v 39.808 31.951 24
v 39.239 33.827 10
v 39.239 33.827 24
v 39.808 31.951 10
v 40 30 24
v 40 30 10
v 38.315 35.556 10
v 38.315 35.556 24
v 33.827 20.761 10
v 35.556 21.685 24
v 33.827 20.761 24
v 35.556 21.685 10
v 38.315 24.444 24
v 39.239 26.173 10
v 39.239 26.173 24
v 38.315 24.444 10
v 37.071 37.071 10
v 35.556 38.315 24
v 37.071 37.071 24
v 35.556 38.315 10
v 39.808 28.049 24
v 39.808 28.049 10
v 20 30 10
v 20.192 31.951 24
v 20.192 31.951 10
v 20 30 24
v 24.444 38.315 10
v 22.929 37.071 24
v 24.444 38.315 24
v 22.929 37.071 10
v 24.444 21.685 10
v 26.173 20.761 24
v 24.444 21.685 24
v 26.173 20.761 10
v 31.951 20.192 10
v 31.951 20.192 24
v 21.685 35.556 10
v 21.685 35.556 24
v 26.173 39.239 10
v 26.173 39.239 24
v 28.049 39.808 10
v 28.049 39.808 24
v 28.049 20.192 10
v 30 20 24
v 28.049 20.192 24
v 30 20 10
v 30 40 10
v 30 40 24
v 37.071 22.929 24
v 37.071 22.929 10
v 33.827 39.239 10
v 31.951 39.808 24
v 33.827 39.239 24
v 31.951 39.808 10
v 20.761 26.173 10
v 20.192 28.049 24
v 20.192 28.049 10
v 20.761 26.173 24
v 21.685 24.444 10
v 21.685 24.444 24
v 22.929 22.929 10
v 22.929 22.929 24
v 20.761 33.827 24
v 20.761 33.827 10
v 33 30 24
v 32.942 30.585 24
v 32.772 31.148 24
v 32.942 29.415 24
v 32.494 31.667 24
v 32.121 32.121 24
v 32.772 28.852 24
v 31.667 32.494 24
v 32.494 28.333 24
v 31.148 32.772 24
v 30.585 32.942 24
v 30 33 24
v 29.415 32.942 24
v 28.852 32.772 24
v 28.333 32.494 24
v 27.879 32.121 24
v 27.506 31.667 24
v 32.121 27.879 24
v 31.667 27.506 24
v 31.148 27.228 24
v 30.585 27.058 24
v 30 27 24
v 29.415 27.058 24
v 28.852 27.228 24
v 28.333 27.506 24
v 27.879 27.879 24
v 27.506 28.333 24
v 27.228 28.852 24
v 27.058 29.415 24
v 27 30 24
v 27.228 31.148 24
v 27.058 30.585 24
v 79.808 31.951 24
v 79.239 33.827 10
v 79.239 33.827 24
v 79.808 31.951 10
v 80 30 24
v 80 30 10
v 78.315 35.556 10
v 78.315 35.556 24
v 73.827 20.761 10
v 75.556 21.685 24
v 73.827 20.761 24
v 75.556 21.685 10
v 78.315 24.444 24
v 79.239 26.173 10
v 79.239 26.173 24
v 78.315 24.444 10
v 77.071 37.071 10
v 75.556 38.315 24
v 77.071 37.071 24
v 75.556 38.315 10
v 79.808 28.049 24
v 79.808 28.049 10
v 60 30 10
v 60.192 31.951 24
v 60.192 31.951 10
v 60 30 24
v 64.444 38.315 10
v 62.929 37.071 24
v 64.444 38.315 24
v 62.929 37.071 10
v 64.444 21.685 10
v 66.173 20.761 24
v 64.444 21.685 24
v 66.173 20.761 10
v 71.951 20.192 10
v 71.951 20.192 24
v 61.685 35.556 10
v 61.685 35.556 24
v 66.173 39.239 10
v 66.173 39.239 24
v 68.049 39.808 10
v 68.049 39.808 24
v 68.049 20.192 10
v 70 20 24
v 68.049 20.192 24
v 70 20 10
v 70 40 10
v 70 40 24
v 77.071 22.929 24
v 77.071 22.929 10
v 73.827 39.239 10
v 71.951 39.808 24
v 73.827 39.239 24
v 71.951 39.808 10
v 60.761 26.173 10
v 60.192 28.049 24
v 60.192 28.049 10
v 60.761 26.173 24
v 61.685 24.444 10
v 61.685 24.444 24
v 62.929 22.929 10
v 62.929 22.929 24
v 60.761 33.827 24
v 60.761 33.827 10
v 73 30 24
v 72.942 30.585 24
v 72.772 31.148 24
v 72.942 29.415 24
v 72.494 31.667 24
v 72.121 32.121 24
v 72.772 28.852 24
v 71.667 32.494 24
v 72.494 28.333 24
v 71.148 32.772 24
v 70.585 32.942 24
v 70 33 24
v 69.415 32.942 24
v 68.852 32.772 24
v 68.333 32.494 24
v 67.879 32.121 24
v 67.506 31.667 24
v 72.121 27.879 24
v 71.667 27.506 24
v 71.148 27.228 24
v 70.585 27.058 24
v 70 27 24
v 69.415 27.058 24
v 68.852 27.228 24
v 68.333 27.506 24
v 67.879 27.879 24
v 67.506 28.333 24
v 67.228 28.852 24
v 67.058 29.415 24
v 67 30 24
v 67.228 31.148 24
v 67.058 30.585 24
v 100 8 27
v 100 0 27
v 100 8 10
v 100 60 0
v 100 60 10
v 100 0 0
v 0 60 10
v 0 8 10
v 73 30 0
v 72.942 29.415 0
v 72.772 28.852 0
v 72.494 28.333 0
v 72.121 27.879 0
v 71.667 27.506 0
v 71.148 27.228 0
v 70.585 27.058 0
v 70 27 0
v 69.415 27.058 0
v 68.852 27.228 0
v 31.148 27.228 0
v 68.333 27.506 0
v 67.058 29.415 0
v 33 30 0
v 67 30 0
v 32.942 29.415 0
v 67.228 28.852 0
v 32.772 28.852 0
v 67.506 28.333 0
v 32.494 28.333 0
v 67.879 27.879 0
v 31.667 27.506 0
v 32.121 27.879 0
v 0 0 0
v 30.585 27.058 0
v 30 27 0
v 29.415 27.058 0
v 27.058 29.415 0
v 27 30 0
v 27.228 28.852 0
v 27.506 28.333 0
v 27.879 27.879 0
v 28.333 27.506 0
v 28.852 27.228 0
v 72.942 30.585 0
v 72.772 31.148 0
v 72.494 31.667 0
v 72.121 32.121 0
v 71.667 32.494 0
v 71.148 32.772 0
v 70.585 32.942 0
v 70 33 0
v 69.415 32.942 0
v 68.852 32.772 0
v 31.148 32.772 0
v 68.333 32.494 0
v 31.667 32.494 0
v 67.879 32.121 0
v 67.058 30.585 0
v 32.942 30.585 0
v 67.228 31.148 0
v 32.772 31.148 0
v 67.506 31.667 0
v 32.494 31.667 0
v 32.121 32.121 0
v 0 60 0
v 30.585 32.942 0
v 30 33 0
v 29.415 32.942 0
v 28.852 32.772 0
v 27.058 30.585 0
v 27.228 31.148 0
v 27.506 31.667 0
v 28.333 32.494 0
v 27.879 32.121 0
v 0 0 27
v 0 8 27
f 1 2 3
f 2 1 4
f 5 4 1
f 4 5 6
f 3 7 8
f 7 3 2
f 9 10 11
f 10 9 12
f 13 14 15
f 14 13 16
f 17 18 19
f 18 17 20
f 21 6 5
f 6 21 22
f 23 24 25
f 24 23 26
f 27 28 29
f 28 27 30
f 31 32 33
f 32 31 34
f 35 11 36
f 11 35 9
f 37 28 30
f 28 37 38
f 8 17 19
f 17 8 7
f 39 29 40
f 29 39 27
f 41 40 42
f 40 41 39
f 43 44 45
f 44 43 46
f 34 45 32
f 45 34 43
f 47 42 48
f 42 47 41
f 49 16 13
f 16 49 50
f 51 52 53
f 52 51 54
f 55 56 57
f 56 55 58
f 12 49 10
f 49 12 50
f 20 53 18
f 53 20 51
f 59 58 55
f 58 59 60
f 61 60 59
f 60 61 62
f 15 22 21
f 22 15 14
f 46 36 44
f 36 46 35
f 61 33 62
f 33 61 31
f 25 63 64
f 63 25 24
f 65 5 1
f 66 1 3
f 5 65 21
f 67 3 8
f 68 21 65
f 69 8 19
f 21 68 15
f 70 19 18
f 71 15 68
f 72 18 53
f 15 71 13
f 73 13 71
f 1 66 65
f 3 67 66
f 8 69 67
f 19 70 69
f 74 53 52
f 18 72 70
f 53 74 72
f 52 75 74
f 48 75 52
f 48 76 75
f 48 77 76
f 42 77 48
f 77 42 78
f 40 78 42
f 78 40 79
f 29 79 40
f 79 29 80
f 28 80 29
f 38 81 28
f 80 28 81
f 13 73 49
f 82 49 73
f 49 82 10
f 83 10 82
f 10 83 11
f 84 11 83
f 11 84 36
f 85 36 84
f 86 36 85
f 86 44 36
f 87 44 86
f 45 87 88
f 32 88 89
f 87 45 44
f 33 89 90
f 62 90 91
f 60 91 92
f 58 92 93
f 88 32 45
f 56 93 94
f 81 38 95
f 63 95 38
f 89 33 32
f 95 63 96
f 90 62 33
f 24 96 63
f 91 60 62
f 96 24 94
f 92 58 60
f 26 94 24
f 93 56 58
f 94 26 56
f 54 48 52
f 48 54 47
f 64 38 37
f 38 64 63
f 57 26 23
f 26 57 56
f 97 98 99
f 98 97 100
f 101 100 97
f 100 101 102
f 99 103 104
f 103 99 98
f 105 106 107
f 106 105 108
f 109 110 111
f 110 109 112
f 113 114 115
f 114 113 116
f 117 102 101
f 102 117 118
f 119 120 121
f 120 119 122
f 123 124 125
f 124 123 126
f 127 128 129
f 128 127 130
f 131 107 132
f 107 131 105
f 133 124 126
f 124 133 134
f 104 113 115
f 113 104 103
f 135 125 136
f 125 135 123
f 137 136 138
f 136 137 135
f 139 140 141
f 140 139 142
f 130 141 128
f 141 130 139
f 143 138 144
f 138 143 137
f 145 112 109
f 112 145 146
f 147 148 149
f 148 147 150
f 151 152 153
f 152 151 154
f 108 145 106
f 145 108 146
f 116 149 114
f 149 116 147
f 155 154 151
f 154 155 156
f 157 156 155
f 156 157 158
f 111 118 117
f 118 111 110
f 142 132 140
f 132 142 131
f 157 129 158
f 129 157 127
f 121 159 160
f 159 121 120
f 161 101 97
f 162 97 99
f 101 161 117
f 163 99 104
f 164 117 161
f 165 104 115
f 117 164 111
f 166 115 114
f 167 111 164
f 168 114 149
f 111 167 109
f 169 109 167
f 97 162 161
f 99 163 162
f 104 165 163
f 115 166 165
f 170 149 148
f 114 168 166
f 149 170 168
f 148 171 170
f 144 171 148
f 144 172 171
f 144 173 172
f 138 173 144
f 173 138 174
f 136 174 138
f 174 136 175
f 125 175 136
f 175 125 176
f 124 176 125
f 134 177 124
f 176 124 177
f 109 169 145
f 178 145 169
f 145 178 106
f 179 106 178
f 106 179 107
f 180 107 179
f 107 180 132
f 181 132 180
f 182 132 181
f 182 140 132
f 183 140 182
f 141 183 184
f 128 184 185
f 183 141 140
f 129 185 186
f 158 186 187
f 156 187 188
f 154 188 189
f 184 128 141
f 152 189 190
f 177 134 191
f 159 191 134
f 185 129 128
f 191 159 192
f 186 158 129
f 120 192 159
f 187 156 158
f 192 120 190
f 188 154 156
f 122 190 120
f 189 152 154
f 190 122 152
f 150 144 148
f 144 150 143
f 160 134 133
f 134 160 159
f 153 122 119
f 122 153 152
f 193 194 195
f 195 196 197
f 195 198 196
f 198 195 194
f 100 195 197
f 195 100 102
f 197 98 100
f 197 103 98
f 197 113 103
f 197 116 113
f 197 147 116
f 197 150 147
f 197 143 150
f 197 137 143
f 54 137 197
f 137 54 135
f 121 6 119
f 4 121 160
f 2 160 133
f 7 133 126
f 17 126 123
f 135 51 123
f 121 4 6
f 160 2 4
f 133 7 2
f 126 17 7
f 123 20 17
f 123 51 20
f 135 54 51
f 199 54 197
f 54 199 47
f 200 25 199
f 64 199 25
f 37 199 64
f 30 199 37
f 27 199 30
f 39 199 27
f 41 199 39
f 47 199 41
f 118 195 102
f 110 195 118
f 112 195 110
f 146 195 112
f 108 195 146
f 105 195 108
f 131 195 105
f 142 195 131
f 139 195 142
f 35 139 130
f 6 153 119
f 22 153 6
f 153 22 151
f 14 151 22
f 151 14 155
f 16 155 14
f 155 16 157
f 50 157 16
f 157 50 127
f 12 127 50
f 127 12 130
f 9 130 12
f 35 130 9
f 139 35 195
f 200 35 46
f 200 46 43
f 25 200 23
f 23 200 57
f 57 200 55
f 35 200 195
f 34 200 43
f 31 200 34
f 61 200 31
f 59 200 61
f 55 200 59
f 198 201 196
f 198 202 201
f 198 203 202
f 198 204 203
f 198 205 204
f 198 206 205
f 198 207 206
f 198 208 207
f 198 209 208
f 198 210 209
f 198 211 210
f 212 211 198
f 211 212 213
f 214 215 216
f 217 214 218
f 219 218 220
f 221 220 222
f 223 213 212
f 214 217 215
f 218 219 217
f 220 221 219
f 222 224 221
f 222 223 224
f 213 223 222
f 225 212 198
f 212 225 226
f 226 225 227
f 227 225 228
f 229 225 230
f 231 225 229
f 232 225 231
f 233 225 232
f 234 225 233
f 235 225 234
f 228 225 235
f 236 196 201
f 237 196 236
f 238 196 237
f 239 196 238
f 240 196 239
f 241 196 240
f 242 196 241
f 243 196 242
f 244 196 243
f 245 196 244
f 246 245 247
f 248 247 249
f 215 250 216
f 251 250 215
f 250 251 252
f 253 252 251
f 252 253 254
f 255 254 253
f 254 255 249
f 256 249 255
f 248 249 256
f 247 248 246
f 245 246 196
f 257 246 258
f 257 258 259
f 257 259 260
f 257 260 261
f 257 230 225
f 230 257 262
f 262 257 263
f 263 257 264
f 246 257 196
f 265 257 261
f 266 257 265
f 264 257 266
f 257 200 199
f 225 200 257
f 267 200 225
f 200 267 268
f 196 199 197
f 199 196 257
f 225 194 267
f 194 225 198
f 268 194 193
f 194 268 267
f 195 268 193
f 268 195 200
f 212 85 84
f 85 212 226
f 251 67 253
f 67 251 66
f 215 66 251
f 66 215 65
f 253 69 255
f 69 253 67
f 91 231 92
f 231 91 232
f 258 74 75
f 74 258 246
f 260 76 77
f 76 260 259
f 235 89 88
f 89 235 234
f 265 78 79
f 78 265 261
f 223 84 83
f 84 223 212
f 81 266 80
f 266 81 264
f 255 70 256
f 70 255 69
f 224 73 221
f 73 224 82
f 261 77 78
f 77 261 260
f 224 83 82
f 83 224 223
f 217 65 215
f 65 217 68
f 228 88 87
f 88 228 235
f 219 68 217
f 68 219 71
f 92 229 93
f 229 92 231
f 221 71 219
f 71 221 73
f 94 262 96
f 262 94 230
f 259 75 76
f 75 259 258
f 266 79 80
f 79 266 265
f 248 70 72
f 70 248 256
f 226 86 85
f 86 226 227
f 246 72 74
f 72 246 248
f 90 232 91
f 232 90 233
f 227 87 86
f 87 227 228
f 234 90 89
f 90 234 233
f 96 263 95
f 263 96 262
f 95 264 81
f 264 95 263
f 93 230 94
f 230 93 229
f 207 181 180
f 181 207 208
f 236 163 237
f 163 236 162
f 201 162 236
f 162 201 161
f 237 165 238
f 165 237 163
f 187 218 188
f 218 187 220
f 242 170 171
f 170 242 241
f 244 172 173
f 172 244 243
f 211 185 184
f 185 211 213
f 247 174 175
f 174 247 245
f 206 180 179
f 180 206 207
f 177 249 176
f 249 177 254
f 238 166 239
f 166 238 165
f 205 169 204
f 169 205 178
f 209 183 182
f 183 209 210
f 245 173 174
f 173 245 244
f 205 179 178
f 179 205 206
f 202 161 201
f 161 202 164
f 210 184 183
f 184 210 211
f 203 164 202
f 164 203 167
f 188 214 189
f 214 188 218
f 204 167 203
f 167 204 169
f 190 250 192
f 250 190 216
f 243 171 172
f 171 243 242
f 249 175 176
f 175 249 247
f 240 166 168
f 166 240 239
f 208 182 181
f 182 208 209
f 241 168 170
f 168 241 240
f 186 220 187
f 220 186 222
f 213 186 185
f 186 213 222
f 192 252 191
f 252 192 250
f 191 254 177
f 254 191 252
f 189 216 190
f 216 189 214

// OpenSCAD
$fn = 32;

// ----------------------------------------------------------------------
// Drill jig: fence jig
// ----------------------------------------------------------------------

// --- parameters (mm) ---
plate_l = 100;            // plate length, X
plate_w = 60;             // plate width, Y
plate_t = 10;             // plate thickness
boss_d = 20;              // guide boss diameter
boss_h = 15;              // boss height above the plate
guide_d = 6;              // guide hole diameter
boss_pitch = 40;          // boss pitch
fence_h = 18;             // fence height above the plate
fence_t = 8;              // fence thickness
fit_tol = 0.05;           // tolerance for press fits, mm
free_tol = 0.2;           // tolerance for clearance fits, mm

n_boss = 2;  // guide bosses
boss_x0 = (plate_l - (n_boss - 1) * boss_pitch) / 2;  // first boss X
boss_top = plate_t - 1 + boss_h;  // boss crown height
fence_top = plate_t - 1 + fence_h;  // fence crown height
total_h = max([fence_top, boss_top]);  // overall height

difference() {
  union() {
  cube([plate_l, plate_w, plate_t]);
  for (i = [0 : n_boss - 1])
    translate([boss_x0 + i * boss_pitch, plate_w / 2, plate_t - 1])
      cylinder(h = boss_h, d = boss_d);
  translate([0, 0, plate_t - 1]) cube([plate_l, fence_t, fence_h]);
  }
  for (i = [0 : n_boss - 1])
    translate([boss_x0 + i * boss_pitch, plate_w / 2, -1])
      cylinder(h = plate_t + boss_h, d = guide_d);
}
